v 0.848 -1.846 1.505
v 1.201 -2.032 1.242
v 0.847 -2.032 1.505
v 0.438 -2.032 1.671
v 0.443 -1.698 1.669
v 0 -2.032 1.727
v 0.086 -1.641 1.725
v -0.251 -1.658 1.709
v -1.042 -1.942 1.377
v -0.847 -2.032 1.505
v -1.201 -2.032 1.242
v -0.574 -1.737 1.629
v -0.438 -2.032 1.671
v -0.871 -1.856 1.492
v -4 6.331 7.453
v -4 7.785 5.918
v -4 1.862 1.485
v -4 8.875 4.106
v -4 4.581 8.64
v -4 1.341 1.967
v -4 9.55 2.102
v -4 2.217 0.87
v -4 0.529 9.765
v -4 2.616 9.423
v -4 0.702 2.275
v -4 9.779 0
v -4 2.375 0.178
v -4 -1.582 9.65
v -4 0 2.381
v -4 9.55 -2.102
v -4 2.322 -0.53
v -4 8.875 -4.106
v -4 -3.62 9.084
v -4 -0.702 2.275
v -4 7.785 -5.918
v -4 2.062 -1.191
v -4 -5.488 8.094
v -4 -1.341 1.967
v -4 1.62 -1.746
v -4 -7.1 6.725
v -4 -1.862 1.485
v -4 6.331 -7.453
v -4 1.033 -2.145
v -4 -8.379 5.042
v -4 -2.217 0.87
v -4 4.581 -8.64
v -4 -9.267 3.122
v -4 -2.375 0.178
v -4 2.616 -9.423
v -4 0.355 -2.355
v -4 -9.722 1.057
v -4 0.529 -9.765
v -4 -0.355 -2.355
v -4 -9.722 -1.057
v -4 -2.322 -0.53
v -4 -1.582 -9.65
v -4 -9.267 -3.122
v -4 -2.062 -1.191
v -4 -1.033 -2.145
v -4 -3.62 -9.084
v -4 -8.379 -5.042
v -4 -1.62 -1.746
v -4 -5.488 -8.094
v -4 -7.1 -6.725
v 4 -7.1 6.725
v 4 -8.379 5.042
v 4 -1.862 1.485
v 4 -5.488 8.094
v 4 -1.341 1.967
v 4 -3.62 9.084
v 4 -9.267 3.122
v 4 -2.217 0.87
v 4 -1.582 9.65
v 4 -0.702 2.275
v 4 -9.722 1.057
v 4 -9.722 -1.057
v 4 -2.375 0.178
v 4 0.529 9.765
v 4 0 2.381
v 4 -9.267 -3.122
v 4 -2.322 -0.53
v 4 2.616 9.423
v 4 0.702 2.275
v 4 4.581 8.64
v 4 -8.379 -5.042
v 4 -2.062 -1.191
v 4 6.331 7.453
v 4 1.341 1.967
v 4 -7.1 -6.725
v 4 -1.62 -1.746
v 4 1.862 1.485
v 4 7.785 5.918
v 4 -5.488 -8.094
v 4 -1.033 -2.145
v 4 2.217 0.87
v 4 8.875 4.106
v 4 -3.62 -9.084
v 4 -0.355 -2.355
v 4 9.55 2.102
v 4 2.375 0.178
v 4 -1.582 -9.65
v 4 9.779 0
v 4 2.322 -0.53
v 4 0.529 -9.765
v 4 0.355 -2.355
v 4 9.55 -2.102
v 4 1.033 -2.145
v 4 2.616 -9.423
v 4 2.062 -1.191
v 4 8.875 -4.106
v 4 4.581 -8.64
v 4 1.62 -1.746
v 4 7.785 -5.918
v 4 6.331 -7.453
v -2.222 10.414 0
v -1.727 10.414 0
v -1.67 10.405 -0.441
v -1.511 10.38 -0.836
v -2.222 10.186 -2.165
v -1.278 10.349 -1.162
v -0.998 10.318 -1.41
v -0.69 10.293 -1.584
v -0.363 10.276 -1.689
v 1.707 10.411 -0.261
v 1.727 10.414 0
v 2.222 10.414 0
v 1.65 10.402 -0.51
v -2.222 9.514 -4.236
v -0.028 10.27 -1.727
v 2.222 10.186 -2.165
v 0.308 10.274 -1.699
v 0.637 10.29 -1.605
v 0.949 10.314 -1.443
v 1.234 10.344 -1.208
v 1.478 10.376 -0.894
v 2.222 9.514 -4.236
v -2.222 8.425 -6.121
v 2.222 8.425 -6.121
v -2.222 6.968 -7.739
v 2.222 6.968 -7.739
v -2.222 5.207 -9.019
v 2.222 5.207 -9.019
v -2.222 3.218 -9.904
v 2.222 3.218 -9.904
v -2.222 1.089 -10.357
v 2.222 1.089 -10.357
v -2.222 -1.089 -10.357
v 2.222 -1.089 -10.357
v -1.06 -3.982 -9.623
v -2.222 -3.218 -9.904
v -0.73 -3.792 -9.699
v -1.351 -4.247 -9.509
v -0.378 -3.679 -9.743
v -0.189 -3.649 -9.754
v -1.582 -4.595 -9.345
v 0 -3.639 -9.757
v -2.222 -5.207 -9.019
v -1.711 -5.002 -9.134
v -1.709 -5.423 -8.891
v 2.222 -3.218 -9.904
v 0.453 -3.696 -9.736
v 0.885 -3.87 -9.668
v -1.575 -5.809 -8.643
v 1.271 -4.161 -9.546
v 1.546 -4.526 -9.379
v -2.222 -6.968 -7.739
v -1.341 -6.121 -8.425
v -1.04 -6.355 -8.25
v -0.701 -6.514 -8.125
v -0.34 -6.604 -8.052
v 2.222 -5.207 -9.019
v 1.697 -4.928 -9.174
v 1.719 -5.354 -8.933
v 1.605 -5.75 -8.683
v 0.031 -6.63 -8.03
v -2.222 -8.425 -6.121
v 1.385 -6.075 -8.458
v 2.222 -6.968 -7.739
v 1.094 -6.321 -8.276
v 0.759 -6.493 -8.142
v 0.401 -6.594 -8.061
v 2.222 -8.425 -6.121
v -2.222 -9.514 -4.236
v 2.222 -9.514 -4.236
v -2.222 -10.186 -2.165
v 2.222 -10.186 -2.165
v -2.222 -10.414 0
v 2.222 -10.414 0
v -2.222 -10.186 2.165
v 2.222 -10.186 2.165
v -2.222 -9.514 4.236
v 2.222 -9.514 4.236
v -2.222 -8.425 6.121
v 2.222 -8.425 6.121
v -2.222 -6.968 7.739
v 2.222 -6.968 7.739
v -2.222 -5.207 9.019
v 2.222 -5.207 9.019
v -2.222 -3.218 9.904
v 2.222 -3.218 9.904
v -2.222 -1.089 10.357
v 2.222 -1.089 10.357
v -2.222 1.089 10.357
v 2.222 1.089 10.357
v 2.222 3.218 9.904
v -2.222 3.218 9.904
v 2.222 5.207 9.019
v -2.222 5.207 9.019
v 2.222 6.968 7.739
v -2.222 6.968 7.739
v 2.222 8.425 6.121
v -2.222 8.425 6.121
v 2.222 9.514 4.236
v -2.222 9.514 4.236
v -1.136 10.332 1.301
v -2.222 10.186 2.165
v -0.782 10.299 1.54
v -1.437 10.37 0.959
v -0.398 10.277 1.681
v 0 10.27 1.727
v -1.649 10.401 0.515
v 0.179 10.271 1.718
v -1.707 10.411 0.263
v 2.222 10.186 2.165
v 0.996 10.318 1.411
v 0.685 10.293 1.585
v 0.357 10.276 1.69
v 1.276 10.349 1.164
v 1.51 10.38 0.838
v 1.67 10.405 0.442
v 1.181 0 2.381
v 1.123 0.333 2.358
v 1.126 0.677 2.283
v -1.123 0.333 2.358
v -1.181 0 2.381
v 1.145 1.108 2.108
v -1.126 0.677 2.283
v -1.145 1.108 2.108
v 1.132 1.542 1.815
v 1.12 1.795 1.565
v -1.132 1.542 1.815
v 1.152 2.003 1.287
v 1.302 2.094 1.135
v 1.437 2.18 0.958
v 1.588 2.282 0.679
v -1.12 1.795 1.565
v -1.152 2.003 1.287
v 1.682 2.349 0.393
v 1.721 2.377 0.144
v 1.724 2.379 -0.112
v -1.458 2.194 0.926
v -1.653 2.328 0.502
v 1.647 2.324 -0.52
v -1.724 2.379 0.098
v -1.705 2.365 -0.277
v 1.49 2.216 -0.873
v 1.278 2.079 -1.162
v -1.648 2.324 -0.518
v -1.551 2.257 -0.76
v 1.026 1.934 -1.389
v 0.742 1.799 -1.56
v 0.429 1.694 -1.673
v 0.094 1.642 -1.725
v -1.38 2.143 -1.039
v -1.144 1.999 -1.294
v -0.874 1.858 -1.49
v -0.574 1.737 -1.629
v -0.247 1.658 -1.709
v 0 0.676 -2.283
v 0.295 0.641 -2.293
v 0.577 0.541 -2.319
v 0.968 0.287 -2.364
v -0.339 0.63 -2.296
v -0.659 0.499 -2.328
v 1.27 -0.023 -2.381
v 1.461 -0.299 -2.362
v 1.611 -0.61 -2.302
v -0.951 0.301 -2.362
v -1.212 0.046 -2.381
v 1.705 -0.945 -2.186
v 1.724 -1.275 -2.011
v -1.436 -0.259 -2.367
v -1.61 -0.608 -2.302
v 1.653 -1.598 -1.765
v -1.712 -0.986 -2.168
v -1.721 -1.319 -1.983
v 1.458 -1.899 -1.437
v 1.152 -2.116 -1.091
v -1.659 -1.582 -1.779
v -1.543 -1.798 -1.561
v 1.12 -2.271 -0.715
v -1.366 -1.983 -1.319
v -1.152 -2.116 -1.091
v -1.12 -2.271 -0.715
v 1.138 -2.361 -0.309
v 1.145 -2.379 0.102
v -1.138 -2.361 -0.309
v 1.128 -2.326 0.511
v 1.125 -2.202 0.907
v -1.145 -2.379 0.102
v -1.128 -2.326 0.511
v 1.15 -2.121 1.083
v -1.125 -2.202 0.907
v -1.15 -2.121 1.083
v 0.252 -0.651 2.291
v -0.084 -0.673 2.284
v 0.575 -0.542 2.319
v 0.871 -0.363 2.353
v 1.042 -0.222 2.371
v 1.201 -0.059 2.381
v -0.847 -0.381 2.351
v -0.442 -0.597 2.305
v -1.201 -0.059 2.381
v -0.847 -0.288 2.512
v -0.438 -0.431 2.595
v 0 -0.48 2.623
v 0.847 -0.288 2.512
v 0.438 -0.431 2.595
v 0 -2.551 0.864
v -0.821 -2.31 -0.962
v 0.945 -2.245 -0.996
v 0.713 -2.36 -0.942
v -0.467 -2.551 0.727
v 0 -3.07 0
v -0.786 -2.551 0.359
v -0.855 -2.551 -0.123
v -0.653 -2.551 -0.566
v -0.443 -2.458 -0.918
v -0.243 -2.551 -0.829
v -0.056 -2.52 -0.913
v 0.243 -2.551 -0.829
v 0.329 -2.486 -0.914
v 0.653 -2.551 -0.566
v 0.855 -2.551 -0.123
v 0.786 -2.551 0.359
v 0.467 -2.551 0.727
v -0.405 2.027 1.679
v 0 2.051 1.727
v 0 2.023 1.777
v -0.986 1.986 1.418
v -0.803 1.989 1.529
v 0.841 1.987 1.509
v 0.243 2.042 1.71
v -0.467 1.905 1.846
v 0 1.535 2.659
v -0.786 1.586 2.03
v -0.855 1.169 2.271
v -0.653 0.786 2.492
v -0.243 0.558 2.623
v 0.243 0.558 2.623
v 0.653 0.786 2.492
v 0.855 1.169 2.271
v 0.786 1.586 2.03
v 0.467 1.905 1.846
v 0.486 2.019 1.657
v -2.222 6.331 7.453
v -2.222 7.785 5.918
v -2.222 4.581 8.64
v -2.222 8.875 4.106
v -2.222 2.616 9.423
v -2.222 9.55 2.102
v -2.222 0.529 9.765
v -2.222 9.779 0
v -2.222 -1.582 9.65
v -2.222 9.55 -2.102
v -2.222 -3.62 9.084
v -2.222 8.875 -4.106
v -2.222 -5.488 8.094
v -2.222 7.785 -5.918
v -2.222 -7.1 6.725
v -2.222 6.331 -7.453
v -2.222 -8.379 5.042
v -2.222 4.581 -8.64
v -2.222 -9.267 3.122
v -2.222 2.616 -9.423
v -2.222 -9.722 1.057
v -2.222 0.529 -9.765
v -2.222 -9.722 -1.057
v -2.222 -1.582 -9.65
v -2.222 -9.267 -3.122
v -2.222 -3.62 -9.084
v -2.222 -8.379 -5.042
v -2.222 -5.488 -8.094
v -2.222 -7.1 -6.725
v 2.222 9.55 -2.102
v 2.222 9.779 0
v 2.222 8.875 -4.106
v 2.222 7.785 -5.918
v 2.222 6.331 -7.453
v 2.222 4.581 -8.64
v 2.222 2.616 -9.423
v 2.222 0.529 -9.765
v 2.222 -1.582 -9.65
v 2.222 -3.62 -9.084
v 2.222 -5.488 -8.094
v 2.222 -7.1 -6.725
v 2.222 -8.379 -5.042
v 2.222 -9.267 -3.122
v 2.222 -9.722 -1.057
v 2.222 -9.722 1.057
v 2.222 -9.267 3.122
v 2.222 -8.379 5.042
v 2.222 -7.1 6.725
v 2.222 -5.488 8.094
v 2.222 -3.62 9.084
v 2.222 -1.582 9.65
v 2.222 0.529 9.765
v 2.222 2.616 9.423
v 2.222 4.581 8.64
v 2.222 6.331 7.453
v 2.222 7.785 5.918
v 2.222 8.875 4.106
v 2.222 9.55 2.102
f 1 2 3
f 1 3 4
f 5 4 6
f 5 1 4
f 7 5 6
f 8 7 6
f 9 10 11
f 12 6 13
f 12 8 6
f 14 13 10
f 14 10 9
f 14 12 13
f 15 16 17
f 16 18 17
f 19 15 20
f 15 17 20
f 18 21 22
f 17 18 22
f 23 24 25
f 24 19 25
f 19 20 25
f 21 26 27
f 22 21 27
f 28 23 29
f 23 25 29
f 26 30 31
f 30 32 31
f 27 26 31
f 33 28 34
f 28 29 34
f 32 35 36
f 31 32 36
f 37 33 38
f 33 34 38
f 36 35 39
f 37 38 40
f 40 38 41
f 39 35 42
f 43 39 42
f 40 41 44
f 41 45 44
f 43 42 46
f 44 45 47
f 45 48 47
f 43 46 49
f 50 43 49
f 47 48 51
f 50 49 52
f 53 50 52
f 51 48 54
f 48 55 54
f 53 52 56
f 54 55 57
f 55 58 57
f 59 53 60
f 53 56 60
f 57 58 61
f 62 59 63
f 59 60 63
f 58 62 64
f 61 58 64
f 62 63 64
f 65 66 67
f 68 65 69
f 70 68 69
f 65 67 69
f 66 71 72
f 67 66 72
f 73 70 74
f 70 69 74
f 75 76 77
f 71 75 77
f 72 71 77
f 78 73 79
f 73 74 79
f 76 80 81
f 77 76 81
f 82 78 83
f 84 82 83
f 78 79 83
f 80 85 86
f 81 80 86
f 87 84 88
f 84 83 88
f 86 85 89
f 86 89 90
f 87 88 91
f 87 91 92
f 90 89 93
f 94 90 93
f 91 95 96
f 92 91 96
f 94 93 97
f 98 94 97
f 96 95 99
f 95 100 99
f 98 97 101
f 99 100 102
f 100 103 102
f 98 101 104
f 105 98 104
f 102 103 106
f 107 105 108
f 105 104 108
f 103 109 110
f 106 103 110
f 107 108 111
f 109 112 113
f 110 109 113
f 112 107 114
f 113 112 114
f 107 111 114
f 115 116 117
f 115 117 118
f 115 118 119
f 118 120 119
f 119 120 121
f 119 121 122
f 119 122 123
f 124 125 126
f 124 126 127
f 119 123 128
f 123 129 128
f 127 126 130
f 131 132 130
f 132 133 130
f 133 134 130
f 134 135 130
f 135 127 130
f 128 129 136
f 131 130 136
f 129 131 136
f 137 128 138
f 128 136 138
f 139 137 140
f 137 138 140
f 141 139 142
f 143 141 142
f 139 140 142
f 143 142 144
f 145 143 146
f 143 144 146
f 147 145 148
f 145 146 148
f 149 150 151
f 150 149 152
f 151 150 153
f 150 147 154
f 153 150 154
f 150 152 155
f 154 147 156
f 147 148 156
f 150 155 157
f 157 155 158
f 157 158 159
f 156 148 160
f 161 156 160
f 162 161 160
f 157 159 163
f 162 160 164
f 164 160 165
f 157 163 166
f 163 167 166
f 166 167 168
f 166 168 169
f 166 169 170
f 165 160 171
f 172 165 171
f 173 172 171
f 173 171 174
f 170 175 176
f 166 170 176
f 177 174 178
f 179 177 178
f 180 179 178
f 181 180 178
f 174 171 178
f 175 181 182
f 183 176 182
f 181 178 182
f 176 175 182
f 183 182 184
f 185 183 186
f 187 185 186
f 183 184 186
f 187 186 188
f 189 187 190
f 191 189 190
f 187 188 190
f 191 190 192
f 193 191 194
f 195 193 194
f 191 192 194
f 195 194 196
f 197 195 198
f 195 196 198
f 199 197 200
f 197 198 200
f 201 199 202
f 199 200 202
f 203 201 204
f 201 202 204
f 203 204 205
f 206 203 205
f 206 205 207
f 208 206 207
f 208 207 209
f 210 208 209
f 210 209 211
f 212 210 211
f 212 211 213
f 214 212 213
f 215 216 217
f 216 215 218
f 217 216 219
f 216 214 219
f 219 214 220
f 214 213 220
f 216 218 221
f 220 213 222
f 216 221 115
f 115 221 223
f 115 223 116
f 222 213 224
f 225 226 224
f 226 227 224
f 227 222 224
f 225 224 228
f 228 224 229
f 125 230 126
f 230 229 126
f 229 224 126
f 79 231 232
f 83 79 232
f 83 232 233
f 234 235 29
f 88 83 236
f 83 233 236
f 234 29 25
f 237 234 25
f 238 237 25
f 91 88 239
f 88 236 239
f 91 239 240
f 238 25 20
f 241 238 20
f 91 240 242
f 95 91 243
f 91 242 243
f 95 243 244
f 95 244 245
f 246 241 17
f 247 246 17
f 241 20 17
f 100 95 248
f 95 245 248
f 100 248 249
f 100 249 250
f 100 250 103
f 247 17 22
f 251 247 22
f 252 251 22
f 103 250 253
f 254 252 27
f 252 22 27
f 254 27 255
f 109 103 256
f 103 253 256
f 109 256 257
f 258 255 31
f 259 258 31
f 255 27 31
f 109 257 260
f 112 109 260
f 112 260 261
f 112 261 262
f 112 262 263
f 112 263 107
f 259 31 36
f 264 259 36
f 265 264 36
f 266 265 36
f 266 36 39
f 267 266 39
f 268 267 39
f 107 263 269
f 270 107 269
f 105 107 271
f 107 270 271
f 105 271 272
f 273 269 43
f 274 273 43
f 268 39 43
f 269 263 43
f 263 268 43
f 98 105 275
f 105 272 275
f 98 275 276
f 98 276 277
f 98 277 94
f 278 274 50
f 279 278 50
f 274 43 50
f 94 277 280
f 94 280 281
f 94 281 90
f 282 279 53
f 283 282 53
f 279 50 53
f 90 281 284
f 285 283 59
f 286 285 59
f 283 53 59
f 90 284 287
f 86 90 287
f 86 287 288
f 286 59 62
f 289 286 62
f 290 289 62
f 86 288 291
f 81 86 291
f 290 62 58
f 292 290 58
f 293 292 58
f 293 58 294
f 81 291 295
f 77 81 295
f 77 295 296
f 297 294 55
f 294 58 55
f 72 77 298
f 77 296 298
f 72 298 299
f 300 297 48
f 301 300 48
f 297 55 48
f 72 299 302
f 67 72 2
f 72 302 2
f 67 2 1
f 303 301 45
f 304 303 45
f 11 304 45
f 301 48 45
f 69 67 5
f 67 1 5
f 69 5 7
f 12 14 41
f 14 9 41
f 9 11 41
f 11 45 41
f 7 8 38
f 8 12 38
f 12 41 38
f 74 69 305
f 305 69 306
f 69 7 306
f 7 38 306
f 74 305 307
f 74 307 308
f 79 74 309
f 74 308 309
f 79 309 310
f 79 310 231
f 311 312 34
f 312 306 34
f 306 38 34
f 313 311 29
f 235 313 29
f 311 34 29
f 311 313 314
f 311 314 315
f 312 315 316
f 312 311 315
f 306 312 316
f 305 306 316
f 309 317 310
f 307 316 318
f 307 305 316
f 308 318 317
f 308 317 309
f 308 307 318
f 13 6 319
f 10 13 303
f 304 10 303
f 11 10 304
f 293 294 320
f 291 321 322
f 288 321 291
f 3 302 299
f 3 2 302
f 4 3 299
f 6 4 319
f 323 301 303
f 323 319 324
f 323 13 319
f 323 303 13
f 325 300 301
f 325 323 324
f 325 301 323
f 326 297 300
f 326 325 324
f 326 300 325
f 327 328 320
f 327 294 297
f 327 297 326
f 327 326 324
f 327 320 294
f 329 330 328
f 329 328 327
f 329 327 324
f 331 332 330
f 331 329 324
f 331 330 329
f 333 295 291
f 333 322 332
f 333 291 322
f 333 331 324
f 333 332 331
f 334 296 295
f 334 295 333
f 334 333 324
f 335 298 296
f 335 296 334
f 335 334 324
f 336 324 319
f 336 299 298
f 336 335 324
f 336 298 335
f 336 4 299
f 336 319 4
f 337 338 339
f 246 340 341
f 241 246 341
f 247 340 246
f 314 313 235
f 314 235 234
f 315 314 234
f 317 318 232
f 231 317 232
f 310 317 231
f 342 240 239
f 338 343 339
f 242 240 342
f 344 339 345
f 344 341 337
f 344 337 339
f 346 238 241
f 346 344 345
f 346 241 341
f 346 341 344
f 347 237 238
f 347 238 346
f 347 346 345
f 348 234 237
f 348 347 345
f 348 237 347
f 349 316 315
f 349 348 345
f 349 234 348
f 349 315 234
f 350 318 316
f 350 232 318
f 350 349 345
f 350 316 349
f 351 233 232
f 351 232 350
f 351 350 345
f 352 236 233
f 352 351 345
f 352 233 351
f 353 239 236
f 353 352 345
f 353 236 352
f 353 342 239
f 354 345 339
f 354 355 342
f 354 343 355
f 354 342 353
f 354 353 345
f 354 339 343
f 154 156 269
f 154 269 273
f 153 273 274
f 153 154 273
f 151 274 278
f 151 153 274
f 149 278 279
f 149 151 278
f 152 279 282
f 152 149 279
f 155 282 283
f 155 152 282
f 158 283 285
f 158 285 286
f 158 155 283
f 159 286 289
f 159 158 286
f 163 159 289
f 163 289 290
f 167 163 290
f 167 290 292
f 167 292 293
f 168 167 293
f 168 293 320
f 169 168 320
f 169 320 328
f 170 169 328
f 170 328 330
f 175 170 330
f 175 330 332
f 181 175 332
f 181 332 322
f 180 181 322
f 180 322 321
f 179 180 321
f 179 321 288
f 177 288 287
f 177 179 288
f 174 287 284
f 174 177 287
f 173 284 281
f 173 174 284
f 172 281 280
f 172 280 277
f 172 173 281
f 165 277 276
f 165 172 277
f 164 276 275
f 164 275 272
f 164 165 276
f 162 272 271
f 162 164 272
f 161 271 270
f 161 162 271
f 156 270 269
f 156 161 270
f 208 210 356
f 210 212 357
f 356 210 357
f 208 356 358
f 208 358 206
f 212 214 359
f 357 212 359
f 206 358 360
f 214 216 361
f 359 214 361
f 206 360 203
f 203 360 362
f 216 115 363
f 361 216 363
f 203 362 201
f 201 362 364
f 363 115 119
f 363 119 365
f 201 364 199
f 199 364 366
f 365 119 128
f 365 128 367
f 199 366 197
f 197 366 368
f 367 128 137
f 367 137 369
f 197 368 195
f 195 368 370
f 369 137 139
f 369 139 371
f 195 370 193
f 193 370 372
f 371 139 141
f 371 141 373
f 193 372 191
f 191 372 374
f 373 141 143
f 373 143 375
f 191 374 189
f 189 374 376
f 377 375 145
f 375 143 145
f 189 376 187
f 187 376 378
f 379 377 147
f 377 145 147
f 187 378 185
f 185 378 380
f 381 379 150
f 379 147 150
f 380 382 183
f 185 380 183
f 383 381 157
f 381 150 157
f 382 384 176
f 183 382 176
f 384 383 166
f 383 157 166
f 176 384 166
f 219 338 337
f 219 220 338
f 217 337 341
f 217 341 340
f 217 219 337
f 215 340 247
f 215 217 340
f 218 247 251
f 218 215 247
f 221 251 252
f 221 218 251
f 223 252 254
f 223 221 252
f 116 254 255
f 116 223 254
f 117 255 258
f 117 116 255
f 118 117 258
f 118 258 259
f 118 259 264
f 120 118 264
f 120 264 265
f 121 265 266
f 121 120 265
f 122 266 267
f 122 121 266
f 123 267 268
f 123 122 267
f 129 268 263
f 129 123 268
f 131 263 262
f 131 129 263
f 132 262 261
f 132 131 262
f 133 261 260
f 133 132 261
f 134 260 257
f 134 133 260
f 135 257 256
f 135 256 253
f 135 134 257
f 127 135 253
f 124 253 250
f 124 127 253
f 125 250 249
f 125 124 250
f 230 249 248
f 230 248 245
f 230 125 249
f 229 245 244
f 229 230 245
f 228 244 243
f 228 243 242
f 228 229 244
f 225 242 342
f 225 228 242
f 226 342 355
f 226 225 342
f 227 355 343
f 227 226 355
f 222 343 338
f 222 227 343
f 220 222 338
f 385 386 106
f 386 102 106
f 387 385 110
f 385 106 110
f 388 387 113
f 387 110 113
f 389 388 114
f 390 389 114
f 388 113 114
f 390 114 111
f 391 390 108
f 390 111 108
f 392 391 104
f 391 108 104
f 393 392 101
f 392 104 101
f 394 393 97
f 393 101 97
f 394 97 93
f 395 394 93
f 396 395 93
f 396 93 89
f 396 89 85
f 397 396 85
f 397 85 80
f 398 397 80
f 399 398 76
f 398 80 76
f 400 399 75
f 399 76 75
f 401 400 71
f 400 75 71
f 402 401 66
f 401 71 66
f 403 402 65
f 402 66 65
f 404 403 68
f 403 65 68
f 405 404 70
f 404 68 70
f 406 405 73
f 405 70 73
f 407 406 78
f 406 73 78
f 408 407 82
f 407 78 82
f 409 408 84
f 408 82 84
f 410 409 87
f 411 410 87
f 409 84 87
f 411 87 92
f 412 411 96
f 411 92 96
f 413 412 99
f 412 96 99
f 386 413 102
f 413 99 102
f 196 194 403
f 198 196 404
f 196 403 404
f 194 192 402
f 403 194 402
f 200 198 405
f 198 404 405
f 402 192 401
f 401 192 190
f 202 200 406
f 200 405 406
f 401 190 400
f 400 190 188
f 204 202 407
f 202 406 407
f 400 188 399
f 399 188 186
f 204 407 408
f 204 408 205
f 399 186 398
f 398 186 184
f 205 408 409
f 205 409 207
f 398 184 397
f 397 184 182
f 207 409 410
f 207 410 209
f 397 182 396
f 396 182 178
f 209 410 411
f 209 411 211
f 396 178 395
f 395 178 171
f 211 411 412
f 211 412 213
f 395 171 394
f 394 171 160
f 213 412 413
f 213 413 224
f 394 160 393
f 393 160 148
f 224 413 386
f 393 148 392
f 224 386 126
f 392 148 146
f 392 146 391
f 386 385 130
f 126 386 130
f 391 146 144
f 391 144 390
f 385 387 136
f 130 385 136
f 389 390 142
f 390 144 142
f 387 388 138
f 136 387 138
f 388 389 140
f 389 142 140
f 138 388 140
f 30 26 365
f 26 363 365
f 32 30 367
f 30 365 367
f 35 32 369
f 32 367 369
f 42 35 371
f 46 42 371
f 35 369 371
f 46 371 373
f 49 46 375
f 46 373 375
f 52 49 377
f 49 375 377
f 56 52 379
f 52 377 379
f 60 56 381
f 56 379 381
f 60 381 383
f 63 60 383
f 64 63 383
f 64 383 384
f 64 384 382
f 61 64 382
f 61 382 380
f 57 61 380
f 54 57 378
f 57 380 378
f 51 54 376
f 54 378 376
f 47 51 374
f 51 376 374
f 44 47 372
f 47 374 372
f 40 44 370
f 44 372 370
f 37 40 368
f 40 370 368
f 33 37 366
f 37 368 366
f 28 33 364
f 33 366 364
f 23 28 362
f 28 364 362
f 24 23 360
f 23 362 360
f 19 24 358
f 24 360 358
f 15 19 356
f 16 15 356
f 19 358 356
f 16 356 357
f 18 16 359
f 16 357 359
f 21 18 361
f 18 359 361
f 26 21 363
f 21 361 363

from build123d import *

# Parameters (mm, degrees)
SKETCH2_R          = 2.38125
CUT_EXTRUDE1_DEPTH = 9
CIRPATTERN1_COUNT  = 2
CIRPATTERN1_ANGLE  = 120


with BuildPart() as part:
    # Sketch1 → Revolve1 (revolve)
    with BuildSketch(Plane.XY):
        Polygon((4, 0), (-4, 0), (-4, 9.779), (-2.222, 9.779), (-2.222, 10.414), (2.222, 10.414), (2.222, 9.779), (4, 9.779), align=None)
    revolve(axis=Axis((8.430806561, 0, 0), (-1, 0, 0)))

    # Sketch2 → Cut-Extrude1 (cut, through all)
    with BuildSketch(Plane.ZY.offset(4)):
        Circle(SKETCH2_R)
    extrude(amount=-CUT_EXTRUDE1_DEPTH, mode=Mode.SUBTRACT)

    # Sketch4 → #8-32 Tapped Hole1 (revolve, cut)
    with BuildSketch(Plane(origin=(0, 10.414, 0), x_dir=(0, 0, 1), z_dir=(1, 0, 0))):
        Polygon((0, 0), (0, 13.483806461), (1.7272, 12.446), (1.7272, 0), align=None)
    f_8_32_tapped_hole1 = revolve(axis=Axis((0, 16.764, 0), (0, -1, 0)), mode=Mode.SUBTRACT)

    # CirPattern1: #8-32 Tapped Hole1 ×2 about axis
    cirpattern1_axis = Axis((4, 0, 0), (-1, 0, 0))
    for i in range(1, CIRPATTERN1_COUNT):
        add(f_8_32_tapped_hole1.rotate(cirpattern1_axis, i * CIRPATTERN1_ANGLE / (CIRPATTERN1_COUNT - 1)), mode=Mode.SUBTRACT)


solid = part.part
